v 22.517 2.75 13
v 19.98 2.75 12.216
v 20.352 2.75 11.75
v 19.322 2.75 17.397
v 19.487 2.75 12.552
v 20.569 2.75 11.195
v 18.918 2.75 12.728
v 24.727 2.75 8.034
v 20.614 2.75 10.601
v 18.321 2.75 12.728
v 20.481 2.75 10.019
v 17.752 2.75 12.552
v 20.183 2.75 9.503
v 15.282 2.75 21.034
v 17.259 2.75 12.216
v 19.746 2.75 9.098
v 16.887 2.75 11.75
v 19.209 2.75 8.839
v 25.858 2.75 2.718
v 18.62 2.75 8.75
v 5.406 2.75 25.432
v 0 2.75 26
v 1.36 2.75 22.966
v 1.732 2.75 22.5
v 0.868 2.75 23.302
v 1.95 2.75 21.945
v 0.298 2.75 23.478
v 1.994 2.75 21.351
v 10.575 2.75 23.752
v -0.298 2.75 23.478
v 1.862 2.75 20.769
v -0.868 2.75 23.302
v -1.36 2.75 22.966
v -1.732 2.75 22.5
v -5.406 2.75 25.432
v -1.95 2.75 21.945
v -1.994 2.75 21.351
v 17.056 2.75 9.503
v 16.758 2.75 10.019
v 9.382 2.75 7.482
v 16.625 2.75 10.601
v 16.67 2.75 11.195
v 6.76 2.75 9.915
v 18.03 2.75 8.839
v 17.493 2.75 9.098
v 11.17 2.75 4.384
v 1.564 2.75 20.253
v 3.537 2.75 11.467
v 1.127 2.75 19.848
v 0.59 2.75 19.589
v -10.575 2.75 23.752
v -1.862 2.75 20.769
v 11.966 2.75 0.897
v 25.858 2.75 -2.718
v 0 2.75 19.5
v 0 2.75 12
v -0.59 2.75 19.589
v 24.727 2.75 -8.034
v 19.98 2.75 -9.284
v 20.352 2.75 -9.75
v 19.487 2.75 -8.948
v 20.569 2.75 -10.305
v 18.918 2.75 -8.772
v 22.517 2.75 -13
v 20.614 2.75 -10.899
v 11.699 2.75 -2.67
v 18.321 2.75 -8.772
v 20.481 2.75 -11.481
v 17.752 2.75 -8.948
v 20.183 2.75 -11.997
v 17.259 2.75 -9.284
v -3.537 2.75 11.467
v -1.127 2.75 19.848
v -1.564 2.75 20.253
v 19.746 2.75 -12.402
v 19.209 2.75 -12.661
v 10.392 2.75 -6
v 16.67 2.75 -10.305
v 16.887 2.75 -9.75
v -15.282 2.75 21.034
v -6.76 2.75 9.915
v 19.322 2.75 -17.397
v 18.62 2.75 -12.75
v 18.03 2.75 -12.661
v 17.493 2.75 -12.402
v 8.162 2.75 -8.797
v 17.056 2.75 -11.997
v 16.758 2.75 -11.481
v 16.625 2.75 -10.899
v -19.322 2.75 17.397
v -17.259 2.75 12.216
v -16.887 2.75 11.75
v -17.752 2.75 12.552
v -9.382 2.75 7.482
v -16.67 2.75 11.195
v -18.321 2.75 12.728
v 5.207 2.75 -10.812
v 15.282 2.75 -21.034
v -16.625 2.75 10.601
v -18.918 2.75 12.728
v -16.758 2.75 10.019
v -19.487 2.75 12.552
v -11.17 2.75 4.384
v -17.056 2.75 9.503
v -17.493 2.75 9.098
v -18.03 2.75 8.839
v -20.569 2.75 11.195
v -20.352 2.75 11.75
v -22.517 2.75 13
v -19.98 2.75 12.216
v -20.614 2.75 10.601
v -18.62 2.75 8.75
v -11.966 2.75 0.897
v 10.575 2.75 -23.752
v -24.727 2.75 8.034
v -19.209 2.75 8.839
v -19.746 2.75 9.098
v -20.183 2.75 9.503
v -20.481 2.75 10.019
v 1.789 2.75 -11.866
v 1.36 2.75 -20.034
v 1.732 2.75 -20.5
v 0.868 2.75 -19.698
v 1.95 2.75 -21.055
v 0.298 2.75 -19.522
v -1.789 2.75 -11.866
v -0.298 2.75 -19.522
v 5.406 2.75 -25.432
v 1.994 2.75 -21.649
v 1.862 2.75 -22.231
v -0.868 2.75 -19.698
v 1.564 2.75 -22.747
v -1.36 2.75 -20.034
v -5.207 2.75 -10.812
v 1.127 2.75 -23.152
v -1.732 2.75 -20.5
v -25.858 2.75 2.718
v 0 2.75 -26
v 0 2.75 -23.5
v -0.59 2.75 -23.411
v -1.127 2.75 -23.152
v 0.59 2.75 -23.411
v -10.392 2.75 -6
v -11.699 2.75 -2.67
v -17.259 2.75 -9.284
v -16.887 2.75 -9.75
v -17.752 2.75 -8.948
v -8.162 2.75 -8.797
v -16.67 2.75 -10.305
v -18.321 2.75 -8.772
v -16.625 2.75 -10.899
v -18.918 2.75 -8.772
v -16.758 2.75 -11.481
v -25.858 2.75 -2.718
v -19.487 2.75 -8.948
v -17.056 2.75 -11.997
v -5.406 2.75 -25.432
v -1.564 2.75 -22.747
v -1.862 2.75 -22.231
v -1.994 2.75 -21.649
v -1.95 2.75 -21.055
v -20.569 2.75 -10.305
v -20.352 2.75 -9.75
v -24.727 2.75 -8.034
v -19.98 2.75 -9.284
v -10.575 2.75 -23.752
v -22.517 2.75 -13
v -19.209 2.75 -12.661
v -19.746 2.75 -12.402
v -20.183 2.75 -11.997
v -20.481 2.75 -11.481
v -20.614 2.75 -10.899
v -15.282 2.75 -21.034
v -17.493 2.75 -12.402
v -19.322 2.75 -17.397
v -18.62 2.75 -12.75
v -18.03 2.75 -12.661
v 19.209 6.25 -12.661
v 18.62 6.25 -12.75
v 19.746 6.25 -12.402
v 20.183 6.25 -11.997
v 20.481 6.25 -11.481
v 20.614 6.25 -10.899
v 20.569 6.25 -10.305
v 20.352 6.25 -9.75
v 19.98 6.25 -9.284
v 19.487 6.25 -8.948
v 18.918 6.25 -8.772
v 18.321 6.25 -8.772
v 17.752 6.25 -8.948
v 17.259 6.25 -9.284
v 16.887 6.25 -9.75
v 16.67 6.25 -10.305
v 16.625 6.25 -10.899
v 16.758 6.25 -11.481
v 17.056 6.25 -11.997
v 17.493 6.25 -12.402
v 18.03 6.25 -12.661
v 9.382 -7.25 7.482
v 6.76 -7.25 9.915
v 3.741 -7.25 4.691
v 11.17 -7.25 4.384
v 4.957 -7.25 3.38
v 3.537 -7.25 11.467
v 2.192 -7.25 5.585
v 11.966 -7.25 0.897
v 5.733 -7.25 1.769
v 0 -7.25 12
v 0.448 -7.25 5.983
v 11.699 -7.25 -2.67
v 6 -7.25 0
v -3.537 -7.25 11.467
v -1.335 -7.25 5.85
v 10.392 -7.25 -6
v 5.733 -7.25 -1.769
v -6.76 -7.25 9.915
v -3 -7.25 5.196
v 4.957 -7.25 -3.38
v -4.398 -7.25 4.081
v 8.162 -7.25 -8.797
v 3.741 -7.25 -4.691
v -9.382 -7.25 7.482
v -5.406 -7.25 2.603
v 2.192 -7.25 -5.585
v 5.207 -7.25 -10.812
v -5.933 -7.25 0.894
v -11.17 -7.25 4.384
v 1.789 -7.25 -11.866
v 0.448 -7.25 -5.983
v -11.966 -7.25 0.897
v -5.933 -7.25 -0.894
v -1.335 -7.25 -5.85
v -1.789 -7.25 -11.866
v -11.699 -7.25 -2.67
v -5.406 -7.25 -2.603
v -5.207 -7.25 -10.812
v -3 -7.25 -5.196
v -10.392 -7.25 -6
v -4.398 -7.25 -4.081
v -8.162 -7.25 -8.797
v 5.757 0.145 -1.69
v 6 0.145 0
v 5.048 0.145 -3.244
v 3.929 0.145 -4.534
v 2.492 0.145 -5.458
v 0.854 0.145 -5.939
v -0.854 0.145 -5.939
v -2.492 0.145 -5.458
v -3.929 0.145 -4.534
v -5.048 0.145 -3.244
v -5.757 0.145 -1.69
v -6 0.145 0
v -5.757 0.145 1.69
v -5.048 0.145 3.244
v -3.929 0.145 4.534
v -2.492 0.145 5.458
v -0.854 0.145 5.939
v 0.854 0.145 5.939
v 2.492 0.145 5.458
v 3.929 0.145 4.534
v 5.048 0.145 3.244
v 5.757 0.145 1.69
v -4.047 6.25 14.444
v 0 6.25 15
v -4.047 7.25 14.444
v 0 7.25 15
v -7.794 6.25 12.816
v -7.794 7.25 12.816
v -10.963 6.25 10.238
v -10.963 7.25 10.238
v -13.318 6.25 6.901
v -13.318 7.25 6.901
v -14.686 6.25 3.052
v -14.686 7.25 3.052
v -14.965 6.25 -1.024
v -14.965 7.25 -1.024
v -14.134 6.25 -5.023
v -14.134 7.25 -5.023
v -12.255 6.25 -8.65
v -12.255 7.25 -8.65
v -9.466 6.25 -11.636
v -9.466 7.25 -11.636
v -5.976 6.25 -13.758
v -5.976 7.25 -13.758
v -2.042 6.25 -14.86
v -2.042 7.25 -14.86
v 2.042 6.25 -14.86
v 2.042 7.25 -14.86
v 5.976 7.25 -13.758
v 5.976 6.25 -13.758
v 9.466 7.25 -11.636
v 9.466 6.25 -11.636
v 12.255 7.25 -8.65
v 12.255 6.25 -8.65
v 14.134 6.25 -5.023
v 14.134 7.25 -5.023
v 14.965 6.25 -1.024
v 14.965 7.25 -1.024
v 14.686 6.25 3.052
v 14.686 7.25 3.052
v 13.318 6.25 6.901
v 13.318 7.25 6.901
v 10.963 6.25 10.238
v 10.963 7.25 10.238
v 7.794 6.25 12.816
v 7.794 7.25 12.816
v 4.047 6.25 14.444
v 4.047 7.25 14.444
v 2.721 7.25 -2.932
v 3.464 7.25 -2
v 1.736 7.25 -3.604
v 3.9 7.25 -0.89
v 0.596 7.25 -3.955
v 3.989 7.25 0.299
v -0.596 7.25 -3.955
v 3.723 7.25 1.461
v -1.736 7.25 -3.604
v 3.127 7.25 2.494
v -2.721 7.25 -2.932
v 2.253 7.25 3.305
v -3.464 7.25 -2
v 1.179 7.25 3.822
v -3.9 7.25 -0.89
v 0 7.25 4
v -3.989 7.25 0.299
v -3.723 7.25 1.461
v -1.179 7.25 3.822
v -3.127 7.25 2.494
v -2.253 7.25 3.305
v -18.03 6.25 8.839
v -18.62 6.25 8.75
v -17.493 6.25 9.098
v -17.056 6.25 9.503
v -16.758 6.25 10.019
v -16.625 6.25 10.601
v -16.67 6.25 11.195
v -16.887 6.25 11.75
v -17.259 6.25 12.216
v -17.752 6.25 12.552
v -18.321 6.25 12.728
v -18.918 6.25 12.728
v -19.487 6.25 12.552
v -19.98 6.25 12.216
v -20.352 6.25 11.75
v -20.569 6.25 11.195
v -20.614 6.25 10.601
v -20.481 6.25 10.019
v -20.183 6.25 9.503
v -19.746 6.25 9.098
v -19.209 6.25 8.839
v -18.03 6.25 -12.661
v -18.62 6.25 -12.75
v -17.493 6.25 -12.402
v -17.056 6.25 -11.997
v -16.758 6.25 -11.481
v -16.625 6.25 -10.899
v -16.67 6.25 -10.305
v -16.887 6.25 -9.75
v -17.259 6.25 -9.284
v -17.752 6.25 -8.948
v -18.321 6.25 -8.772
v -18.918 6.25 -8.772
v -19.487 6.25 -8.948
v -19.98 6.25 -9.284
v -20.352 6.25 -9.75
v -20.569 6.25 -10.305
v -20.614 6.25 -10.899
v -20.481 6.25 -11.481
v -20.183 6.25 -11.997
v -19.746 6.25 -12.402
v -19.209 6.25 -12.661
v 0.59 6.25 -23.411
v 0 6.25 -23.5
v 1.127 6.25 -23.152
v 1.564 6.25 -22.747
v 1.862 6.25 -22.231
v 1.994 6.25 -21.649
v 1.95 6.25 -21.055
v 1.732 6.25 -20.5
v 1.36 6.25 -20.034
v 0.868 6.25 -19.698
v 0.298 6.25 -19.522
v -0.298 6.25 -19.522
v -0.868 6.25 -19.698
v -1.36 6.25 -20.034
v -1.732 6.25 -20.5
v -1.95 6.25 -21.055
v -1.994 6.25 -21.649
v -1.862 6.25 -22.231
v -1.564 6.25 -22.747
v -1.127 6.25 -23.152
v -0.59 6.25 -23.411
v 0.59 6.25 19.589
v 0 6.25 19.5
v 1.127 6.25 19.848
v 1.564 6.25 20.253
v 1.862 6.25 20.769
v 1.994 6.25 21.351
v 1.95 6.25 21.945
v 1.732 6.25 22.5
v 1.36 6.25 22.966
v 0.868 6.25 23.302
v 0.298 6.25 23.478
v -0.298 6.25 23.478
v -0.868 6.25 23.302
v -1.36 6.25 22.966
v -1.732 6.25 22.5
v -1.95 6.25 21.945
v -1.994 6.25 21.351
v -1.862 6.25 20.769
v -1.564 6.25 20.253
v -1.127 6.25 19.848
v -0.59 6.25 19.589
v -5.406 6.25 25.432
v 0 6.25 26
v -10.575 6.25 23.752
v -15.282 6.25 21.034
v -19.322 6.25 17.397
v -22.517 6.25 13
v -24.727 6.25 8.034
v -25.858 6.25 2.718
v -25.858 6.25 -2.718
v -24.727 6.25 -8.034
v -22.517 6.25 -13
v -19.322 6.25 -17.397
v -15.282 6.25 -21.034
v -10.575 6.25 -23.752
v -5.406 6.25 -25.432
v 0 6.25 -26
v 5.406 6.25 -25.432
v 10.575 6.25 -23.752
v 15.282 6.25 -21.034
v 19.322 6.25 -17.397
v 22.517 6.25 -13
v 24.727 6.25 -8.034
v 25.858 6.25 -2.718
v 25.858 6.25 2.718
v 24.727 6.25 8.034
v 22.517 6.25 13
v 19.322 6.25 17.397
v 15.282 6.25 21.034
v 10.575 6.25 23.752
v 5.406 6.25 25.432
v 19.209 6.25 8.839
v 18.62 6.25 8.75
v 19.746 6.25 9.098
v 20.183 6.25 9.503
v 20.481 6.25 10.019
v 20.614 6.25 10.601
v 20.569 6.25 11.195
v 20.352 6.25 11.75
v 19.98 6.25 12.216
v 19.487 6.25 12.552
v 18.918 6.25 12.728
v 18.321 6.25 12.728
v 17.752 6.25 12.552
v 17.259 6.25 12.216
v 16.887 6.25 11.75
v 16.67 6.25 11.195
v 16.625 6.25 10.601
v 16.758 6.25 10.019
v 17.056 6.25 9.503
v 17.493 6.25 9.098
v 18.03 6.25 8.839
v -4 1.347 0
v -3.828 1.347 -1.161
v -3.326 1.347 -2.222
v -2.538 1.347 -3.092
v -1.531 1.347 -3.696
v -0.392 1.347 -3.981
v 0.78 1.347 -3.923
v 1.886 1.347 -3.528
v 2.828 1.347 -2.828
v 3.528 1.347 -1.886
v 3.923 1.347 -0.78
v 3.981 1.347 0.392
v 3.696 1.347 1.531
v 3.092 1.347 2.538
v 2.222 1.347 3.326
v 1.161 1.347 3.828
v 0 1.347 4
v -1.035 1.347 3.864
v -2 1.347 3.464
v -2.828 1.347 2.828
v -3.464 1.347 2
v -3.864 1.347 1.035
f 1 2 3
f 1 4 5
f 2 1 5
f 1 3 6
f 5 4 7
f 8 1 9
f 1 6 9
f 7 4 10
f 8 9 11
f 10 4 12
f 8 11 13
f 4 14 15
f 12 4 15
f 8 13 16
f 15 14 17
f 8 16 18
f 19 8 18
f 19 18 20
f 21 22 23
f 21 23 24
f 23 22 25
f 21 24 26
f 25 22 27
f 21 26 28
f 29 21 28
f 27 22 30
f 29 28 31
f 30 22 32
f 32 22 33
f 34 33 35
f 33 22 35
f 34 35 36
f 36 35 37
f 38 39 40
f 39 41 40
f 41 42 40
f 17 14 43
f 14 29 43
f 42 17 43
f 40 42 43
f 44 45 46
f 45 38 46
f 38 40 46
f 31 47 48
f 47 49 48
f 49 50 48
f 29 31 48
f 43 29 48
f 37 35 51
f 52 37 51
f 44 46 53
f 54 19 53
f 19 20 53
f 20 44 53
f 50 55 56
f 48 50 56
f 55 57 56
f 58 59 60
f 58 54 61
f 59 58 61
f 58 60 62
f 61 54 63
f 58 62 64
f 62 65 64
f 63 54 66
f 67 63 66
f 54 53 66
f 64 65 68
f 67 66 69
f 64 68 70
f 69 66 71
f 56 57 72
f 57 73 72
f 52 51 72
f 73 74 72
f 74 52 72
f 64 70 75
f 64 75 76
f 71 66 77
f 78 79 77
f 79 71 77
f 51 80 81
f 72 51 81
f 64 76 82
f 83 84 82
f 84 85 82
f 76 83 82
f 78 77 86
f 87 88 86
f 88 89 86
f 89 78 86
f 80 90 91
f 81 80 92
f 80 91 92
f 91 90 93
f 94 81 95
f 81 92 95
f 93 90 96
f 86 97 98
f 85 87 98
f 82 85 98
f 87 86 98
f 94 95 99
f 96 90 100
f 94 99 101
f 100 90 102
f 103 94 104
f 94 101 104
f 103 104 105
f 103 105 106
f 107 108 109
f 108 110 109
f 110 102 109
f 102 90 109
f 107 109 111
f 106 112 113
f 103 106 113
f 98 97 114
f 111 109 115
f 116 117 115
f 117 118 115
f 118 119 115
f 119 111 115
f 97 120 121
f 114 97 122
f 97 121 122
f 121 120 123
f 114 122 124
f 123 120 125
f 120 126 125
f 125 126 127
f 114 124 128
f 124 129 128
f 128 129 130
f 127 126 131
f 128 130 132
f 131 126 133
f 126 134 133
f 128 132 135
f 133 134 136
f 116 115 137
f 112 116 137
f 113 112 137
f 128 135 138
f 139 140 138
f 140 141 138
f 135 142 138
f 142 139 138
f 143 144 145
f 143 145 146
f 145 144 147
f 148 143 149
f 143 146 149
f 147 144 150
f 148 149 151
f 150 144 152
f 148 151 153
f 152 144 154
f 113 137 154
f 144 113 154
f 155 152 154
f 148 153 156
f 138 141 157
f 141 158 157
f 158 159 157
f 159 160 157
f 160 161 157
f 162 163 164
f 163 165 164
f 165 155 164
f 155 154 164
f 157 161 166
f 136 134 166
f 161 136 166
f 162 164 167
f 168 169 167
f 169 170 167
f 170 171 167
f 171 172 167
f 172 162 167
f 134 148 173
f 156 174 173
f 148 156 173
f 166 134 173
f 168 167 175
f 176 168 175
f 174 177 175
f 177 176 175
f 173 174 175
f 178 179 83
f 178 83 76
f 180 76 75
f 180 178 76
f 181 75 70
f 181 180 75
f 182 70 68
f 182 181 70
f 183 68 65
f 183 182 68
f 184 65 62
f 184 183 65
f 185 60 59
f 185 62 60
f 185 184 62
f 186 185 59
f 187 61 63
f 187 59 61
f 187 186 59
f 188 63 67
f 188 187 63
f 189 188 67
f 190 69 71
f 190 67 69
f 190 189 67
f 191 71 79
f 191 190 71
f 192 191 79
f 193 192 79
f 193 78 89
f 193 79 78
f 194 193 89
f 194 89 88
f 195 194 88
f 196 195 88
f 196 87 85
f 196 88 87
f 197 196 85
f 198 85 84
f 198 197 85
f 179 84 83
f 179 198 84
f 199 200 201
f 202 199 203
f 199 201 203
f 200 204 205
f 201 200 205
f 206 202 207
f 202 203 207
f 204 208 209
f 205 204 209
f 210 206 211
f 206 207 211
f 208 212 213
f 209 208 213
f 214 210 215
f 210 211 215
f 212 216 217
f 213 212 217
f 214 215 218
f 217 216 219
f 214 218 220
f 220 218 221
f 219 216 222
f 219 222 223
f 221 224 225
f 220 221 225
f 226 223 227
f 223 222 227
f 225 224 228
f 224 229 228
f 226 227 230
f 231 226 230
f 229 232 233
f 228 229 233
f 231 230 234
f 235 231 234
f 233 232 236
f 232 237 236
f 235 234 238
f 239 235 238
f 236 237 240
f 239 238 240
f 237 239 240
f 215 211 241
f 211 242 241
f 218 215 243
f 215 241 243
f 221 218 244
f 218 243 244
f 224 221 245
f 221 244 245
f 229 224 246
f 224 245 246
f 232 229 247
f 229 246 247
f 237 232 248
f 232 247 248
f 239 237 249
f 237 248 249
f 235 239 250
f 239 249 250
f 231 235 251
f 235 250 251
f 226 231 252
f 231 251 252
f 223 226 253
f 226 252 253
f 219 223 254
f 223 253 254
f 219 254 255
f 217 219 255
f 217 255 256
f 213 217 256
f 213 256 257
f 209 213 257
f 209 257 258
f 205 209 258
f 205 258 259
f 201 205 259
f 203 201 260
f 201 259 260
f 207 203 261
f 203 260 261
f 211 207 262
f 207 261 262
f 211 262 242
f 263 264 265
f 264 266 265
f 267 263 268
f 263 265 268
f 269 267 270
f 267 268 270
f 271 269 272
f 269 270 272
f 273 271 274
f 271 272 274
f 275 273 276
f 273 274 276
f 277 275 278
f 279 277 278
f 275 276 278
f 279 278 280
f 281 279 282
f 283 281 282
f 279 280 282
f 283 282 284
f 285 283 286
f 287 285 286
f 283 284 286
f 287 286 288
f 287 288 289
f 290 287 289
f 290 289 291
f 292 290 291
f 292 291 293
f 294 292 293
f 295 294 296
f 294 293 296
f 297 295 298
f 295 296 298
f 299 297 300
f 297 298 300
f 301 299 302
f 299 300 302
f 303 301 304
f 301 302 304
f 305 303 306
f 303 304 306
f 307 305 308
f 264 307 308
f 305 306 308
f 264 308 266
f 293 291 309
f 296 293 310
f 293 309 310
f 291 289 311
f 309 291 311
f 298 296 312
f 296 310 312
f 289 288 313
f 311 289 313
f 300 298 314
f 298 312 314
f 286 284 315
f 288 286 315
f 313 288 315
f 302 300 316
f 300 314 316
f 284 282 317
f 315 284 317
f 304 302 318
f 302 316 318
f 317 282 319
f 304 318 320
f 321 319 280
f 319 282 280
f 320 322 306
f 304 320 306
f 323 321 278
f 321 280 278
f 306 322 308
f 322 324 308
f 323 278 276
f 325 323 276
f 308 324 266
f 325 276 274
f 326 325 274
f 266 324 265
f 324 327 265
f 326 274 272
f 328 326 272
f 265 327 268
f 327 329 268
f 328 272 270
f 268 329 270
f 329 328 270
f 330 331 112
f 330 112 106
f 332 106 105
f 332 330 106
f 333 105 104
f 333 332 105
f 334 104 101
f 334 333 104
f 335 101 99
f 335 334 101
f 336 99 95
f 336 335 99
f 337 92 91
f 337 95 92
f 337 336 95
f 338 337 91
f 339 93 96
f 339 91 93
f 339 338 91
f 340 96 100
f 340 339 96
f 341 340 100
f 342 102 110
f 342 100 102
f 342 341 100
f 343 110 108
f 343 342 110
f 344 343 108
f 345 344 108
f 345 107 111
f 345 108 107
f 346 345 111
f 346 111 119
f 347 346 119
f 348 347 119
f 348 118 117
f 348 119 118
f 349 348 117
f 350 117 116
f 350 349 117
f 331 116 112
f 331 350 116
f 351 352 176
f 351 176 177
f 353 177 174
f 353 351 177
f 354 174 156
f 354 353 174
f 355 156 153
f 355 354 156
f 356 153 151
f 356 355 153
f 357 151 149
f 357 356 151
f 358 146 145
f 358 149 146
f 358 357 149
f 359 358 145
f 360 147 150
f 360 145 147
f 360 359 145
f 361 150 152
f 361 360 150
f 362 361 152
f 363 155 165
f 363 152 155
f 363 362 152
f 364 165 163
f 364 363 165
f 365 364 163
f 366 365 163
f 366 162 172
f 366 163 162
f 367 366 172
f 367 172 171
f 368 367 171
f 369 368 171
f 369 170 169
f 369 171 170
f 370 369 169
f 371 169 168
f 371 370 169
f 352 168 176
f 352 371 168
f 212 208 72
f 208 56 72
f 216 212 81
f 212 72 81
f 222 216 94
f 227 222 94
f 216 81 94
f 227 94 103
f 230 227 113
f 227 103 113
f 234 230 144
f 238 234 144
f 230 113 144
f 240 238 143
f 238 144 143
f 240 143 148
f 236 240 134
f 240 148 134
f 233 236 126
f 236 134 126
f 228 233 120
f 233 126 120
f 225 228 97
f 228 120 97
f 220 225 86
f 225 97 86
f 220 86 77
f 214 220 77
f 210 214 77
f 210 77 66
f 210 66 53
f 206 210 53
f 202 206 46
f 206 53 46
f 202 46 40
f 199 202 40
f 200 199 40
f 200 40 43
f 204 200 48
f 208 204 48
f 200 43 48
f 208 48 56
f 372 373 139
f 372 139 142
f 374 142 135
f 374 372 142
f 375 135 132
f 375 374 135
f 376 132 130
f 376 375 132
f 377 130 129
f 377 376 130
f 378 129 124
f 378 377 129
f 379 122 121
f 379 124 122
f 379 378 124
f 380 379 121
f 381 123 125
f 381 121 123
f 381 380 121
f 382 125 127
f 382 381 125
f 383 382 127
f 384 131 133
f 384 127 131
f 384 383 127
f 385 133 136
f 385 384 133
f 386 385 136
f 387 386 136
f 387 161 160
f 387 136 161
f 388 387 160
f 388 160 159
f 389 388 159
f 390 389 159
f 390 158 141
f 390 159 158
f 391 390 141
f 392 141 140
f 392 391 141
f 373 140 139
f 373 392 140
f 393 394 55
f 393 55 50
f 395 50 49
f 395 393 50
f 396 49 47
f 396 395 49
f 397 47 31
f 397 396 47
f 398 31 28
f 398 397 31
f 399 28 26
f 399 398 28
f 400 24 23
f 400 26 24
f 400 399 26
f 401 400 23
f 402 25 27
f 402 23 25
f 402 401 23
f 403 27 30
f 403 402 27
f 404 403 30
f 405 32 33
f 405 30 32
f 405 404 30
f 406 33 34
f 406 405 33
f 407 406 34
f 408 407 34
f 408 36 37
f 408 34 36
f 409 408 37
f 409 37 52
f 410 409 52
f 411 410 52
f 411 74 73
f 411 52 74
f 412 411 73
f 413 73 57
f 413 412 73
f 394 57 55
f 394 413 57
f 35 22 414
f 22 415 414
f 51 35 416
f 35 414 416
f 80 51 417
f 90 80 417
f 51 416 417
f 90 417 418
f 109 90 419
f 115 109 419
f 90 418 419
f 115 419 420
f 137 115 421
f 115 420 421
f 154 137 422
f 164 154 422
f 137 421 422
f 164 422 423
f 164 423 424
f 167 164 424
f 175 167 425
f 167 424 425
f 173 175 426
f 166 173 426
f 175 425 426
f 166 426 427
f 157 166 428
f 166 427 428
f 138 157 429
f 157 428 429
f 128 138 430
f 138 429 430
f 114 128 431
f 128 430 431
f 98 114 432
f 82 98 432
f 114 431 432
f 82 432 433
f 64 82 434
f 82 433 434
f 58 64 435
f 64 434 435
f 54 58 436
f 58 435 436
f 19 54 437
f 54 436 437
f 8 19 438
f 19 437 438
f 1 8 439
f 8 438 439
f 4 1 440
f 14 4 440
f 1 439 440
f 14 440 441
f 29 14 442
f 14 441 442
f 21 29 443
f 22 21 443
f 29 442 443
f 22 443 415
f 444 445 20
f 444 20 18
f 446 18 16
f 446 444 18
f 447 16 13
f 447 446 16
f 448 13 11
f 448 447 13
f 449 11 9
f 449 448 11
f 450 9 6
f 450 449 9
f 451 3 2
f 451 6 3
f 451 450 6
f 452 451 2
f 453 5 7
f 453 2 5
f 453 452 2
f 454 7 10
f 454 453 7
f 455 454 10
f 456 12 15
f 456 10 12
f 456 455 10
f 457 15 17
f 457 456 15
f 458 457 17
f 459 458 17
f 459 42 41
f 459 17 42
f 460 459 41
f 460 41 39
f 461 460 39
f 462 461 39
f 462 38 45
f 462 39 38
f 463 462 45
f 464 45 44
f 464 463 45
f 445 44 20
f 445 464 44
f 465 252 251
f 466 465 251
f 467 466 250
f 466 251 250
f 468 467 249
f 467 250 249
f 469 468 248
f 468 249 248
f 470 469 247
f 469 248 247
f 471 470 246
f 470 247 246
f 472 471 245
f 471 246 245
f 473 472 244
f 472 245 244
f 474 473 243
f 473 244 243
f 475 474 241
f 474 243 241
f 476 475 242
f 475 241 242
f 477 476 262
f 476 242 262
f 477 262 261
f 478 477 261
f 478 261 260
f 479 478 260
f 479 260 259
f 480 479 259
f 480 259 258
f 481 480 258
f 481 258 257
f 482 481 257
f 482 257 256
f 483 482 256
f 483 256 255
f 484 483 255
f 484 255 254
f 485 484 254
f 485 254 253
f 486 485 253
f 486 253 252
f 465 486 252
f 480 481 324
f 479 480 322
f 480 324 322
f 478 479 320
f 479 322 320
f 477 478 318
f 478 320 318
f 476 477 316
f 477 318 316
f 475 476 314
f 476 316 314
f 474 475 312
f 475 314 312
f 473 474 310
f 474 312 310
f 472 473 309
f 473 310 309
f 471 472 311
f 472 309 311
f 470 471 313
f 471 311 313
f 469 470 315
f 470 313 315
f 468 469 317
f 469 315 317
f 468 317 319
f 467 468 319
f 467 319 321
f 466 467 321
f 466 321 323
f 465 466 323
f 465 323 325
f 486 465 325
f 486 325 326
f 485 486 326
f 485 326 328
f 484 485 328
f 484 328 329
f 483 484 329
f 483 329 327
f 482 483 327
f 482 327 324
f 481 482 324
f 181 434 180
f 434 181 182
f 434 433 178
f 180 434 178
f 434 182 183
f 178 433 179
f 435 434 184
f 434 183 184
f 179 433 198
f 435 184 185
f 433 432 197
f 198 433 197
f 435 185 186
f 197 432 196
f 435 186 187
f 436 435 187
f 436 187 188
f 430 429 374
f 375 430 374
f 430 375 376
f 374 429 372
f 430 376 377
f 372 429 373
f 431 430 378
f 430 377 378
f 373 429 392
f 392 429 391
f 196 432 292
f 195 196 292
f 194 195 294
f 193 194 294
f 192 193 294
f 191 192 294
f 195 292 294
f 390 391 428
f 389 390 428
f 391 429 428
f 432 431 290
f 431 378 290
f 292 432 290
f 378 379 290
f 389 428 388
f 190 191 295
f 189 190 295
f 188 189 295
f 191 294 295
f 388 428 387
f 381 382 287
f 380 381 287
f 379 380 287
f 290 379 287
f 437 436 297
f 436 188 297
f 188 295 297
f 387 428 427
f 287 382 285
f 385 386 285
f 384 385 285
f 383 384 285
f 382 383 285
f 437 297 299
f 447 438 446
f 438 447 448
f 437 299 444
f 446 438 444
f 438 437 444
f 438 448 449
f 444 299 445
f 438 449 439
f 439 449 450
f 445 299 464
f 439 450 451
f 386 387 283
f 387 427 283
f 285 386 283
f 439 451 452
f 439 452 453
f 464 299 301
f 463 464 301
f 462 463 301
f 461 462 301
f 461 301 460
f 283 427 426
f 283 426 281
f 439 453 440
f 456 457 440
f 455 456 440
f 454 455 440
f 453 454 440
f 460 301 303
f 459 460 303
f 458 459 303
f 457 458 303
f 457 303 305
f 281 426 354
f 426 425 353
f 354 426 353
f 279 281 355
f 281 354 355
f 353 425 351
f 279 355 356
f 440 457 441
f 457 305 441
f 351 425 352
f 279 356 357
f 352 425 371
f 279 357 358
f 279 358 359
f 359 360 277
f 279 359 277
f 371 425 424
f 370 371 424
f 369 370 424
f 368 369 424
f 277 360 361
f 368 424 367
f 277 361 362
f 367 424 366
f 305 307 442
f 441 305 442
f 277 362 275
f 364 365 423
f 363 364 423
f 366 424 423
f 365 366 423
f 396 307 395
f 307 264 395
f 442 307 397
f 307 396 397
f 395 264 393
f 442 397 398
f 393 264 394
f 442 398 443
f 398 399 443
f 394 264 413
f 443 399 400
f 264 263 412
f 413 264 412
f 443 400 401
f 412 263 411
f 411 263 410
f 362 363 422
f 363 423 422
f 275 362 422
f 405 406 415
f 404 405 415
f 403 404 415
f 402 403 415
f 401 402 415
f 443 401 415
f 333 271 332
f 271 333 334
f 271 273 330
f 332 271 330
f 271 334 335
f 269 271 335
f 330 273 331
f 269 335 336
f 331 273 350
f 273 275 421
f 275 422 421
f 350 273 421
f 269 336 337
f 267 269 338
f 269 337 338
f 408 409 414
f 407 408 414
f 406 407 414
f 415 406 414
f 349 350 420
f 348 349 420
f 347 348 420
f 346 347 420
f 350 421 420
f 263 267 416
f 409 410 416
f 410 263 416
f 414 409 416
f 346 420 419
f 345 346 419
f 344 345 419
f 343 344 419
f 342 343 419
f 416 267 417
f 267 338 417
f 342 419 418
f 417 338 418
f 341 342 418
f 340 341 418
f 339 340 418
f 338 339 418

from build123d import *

# Parameters (mm, degrees)
TAP_DRILL_FOR_M12X1_25_TAP1_D     = 12
TAP_DRILL_FOR_M12X1_25_TAP1_DEPTH = 7.394836286
TAP_DRILL_FOR_M12X1_25_TAP1_TIP   = 3.605163714
SKETCH5_R                         = 4
CUT_EXTRUDE1_DEPTH                = 40.525308348
CUT_EXTRUDE2_DEPTH                = 39.105117767
CUT_EXTRUDE2_DEPTH_BACK           = 39.105117767
SKETCH6_R                         = 2


with BuildPart() as part:
    # Sketch1 → Revolve1 (revolve)
    with BuildSketch(Plane.XY, mode=Mode.PRIVATE) as revolve1_sk:
        Polygon((0, 7.25), (0, -7.25), (12, -7.25), (12, 2.75), (26, 2.75), (26, 6.25), (15, 6.25), (15, 7.25), align=None)
    revolve(revolve1_sk.sketch.rotate(Axis((0, 11.233516484, 0), (0, -1, 0)), 90), axis=Axis((0, 11.233516484, 0), (0, -1, 0)))

    # Tap Drill for M12x1.25 Tap1
    with Locations(Plane(origin=(0, -7.25, 0), x_dir=(-1, 0, 0), z_dir=(0, -1, 0))):
        with Locations((0, 0)):
            Hole(TAP_DRILL_FOR_M12X1_25_TAP1_D / 2, depth=TAP_DRILL_FOR_M12X1_25_TAP1_DEPTH)
            with Locations((0, 0, -(TAP_DRILL_FOR_M12X1_25_TAP1_DEPTH + TAP_DRILL_FOR_M12X1_25_TAP1_TIP / 2))):  # 118° drill point
                Cone(0, TAP_DRILL_FOR_M12X1_25_TAP1_D / 2, TAP_DRILL_FOR_M12X1_25_TAP1_TIP, mode=Mode.SUBTRACT)

    # Sketch5 → Cut-Extrude1 (cut, through all)
    with BuildSketch(Plane(origin=(0, 7.25, 0), x_dir=(1, 0, 0), z_dir=(0, 1, 0))):
        with Locations(Location((0, 0, 0), (0, 0, 270))):
            Circle(SKETCH5_R)
    extrude(amount=-CUT_EXTRUDE1_DEPTH, mode=Mode.SUBTRACT)

    # Sketch6 → Cut-Extrude2 (cut, two sides: drawn at the far end of the back side and taken through both)
    with BuildSketch(Plane.XZ.offset(-2.75).offset(-CUT_EXTRUDE2_DEPTH_BACK)):
        with Locations(Location((-18.619546181, 10.75, 0), (0, 0, 270))):
            Circle(SKETCH6_R)
        with Locations(Location((0, 21.5, 0), (0, 0, 270))):
            Circle(SKETCH6_R)
        with Locations(Location((18.619546181, 10.75, 0), (0, 0, 270))):
            Circle(SKETCH6_R)
        with Locations(Location((18.619546181, -10.75, 0), (0, 0, 270))):
            Circle(SKETCH6_R)
        with Locations(Location((0, -21.5, 0), (0, 0, 270))):
            Circle(SKETCH6_R)
        with Locations(Location((-18.619546181, -10.75, 0), (0, 0, 270))):
            Circle(SKETCH6_R)
    extrude(amount=CUT_EXTRUDE2_DEPTH + CUT_EXTRUDE2_DEPTH_BACK, mode=Mode.SUBTRACT)


solid = part.part
